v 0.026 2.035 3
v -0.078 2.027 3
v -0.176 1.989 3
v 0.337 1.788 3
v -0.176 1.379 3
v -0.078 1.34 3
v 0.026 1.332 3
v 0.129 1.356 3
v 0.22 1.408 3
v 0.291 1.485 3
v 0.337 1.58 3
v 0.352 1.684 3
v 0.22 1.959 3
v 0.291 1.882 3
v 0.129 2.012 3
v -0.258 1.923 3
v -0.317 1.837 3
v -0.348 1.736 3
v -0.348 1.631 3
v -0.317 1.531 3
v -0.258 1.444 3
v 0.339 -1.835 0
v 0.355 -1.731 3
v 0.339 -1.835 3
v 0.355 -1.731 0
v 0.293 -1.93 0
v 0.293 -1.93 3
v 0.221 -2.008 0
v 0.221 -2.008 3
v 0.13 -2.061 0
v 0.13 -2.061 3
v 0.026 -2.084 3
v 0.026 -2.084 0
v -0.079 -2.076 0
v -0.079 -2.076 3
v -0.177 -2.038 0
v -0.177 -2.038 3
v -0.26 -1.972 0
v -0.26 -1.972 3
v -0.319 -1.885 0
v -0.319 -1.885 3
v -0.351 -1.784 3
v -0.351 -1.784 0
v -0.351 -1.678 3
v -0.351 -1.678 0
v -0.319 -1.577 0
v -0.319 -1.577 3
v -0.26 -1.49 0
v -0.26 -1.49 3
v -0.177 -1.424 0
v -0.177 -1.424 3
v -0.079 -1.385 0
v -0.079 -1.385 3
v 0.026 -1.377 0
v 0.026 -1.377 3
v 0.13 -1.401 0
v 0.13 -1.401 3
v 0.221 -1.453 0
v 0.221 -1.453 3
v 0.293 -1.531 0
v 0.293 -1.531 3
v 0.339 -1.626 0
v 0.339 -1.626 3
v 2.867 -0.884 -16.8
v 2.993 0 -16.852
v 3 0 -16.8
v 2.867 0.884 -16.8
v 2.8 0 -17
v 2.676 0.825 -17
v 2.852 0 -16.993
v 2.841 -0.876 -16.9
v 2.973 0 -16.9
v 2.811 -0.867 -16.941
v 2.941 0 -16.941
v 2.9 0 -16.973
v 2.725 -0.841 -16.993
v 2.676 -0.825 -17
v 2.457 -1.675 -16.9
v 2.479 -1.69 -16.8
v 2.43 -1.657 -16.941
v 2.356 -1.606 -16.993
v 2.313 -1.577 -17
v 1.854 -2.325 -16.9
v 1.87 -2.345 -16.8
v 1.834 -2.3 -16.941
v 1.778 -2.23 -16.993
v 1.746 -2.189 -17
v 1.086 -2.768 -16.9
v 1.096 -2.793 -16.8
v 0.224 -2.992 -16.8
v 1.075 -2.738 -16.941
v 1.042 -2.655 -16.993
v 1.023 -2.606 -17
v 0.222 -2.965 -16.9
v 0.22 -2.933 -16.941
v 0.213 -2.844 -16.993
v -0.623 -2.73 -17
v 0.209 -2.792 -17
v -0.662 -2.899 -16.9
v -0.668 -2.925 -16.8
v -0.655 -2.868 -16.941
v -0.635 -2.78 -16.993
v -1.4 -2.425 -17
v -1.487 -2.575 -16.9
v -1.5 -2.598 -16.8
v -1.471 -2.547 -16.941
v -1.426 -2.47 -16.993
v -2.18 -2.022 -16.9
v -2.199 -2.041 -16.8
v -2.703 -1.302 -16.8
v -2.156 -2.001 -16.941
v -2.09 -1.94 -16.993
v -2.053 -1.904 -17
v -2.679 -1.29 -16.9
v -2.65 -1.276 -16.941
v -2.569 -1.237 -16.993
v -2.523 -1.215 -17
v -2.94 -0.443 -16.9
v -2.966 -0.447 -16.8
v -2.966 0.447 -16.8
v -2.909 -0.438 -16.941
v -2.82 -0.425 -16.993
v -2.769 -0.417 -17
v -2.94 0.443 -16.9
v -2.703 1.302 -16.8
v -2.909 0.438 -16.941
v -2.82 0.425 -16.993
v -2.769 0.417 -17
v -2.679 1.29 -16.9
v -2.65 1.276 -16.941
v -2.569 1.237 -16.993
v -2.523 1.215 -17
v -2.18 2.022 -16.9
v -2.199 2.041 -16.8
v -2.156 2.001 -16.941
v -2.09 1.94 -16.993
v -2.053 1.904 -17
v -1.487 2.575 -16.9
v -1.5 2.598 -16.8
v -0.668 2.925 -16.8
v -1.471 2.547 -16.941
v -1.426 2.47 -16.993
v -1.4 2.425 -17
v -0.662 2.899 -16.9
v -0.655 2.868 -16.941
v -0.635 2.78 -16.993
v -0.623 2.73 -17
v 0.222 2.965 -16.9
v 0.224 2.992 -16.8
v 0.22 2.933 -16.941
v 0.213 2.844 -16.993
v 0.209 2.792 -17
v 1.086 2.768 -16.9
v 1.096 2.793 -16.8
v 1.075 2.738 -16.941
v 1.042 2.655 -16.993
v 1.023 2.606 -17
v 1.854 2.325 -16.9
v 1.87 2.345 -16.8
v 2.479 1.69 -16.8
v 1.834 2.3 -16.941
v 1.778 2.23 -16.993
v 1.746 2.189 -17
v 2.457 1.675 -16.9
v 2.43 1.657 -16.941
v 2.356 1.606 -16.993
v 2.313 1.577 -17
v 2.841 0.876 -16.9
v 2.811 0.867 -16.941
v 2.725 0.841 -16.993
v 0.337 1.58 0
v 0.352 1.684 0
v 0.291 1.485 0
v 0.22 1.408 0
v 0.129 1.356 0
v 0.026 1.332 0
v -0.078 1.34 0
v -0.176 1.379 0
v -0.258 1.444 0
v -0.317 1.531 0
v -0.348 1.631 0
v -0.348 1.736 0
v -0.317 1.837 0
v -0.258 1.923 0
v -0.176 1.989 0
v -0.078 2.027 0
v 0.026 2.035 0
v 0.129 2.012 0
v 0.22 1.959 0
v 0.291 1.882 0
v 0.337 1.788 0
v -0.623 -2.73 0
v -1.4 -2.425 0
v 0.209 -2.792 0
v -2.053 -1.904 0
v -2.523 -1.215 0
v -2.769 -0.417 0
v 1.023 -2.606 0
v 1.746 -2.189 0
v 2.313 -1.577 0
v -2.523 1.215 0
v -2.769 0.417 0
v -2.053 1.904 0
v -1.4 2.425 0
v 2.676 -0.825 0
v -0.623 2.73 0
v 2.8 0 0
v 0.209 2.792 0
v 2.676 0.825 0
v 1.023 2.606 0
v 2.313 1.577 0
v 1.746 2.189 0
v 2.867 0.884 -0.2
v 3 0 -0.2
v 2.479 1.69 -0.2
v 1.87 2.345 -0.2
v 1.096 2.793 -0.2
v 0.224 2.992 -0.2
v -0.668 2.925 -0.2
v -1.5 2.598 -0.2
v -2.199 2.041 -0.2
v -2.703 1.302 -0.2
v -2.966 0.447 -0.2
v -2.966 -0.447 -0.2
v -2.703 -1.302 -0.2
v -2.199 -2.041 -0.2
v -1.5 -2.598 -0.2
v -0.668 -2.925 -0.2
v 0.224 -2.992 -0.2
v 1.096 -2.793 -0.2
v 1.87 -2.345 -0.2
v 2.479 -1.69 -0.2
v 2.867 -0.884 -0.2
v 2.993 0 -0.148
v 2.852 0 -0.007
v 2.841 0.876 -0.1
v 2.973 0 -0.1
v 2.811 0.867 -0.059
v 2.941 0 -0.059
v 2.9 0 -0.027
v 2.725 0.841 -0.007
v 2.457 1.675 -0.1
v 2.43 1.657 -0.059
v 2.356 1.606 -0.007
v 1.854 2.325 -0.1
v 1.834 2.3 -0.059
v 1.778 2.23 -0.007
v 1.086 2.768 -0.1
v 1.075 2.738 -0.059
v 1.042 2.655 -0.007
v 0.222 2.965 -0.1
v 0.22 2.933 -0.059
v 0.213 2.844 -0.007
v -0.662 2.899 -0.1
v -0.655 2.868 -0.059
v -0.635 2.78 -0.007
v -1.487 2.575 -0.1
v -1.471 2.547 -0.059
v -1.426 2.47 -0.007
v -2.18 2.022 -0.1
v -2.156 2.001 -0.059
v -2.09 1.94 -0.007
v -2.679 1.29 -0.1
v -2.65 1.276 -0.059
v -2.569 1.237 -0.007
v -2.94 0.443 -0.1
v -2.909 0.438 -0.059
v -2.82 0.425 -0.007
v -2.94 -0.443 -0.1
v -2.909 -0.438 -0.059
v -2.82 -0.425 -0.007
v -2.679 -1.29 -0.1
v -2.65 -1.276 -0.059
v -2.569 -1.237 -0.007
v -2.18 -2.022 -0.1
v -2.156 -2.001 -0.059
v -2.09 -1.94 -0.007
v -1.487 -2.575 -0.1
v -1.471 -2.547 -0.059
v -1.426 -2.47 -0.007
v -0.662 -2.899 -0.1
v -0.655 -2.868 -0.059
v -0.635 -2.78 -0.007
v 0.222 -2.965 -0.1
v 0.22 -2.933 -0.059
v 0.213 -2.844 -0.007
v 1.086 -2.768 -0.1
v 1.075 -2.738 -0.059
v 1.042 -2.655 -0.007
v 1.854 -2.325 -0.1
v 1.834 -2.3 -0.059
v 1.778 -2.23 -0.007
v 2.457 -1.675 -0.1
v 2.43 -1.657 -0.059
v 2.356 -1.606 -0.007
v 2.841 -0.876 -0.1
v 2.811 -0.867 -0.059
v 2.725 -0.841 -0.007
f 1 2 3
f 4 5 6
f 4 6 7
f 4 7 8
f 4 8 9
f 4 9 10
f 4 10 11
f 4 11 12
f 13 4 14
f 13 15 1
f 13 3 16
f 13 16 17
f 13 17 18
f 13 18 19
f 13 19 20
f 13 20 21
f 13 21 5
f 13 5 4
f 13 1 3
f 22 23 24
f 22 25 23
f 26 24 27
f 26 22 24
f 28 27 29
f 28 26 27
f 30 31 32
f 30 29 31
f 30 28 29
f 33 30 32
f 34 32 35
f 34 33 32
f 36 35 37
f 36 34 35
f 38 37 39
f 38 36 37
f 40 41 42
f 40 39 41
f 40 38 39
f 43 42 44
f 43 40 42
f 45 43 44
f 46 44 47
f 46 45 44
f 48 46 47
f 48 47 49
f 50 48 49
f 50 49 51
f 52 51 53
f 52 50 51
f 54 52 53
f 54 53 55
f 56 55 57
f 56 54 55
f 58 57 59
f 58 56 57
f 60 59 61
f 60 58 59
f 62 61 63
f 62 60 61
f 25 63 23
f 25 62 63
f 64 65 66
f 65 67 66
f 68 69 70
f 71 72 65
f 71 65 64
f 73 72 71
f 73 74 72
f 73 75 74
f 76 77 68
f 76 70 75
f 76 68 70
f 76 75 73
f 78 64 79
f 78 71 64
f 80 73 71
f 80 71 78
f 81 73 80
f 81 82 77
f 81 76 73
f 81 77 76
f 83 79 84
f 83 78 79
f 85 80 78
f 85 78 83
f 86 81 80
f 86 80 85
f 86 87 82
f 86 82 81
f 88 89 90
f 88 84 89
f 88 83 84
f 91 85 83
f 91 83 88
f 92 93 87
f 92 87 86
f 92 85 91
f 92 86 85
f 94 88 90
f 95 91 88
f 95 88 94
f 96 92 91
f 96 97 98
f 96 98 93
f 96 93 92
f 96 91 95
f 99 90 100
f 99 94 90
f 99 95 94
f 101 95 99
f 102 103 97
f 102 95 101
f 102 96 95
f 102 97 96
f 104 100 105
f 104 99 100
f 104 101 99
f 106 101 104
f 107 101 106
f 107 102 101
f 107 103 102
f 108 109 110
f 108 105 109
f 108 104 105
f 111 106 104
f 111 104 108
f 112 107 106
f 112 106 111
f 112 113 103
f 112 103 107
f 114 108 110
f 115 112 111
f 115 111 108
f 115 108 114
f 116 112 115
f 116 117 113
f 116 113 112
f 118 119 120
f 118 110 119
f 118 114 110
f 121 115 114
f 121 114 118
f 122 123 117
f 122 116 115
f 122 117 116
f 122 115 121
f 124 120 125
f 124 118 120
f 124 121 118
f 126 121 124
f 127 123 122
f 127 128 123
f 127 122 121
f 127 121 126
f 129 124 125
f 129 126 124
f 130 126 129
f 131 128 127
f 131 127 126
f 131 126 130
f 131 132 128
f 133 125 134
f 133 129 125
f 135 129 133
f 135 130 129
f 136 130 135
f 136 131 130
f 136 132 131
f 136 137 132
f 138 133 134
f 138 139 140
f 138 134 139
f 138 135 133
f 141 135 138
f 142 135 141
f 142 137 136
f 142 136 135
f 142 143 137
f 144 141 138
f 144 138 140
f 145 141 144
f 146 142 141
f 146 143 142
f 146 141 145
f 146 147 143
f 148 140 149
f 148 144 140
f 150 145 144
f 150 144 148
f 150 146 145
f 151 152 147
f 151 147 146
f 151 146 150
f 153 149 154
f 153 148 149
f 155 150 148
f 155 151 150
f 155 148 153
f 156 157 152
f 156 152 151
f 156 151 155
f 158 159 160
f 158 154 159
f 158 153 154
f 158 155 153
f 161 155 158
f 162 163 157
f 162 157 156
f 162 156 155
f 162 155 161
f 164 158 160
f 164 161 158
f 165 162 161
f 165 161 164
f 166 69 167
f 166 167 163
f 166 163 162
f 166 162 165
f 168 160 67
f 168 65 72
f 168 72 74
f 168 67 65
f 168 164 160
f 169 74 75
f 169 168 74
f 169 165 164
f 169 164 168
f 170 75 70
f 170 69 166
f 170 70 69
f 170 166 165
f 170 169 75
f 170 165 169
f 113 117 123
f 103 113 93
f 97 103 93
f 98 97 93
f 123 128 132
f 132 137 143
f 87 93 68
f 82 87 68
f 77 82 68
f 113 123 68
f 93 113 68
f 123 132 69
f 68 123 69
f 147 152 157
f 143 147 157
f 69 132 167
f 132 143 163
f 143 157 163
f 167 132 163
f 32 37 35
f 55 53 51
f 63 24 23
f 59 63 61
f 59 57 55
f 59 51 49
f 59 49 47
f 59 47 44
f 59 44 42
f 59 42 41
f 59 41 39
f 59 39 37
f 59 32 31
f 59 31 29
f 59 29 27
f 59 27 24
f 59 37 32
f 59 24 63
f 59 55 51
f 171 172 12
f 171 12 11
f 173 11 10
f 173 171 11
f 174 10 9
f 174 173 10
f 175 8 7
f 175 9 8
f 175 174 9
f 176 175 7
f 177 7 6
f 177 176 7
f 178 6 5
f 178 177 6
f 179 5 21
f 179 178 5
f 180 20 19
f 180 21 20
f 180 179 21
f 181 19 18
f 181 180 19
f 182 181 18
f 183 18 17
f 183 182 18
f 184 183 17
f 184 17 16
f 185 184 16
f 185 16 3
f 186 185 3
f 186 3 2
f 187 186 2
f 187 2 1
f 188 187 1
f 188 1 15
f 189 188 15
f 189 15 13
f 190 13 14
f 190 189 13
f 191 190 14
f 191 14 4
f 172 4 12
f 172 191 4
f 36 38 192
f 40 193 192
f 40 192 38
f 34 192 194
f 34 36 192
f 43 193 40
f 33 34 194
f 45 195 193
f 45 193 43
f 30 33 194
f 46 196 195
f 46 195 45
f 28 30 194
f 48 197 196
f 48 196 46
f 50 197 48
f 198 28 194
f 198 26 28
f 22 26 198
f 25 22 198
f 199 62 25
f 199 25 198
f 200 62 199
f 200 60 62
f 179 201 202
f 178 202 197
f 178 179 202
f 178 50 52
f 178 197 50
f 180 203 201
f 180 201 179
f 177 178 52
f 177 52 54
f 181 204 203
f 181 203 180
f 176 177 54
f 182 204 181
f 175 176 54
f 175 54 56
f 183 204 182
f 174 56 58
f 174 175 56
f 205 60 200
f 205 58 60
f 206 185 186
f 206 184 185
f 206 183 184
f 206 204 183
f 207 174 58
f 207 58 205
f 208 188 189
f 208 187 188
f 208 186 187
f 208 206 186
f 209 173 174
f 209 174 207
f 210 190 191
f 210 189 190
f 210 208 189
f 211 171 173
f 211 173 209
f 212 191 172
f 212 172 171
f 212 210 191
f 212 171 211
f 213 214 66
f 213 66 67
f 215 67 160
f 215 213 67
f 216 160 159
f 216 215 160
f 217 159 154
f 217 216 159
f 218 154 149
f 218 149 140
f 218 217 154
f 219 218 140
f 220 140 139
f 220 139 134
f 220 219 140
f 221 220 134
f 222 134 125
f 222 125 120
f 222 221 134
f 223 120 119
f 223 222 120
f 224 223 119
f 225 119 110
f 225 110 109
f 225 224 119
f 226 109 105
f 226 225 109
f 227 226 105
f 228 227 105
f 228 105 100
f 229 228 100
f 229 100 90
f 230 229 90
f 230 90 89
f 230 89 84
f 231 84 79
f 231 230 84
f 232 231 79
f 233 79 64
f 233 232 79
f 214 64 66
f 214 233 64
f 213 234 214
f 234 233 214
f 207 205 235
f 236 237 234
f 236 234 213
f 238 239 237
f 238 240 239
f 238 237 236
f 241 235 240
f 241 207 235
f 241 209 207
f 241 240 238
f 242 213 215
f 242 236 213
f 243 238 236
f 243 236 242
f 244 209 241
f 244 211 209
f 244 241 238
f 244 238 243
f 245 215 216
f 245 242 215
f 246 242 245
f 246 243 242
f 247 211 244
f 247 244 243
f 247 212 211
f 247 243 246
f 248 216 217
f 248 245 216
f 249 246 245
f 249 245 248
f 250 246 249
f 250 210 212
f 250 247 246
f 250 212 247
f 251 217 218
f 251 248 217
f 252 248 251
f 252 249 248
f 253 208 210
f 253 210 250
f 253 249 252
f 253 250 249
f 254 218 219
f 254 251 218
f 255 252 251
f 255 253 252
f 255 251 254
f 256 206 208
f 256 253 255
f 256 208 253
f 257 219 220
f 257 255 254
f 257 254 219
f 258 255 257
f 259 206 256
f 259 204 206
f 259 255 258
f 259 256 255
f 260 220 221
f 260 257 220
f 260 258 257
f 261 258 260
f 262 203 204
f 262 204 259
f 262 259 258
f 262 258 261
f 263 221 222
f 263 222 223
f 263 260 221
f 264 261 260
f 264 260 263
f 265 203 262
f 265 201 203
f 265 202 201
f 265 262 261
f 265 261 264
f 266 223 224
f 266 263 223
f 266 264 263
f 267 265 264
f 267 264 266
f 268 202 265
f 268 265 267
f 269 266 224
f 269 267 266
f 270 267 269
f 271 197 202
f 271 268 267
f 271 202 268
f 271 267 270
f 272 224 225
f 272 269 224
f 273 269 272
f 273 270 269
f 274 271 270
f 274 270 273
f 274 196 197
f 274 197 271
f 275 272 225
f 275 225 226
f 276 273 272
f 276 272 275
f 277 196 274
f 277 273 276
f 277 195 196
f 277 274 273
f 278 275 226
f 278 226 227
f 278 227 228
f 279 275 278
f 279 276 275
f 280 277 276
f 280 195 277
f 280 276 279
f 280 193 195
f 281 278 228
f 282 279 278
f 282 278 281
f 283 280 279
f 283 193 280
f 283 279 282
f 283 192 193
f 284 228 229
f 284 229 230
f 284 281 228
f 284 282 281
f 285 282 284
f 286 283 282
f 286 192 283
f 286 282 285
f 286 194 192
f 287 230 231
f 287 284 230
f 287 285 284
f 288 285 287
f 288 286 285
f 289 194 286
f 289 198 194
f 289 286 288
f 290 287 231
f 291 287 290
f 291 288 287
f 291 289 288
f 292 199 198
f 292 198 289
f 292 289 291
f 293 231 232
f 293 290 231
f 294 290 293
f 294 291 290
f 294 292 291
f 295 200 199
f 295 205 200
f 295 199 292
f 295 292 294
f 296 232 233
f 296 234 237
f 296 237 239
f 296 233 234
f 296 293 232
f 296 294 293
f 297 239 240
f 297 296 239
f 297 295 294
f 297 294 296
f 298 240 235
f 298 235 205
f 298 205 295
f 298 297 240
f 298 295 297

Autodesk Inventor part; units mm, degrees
ref_plane "YZ Plane" through (0, 0, 0) normal (1, 0, 0) x (0, 1, 0)
ref_plane "XZ Plane" through (0, 0, 0) normal (0, 1, 0) x (-1, 0, 0)
ref_plane "XY Plane" through (0, 0, 0) normal (0, 0, 1) x (1, 0, 0)
sketch "Эскиз1" plane through (0, 0, 0) normal (0, 0, 1) x (1, 0, 0)
  circle A0 centre (0, 0) radius 3
  circle A1 centre (0, 1.6837) radius 0.3522
  circle A2 centre (0, -1.7307) radius 0.3546
  dimension "d0" = 6
extrude "Выдавливание1" add sketch "Эскиз1" against normal blind 17 contours A0 | A1 | A2
extrude "Выдавливание2" add sketch "Эскиз1" along normal blind 3 contours A1 | A2
fillet "Сопряжение1" radius 0.2 2 edges at (-3, 0, 0) (-3, 0, -17)
properties part number "термодатчик"
